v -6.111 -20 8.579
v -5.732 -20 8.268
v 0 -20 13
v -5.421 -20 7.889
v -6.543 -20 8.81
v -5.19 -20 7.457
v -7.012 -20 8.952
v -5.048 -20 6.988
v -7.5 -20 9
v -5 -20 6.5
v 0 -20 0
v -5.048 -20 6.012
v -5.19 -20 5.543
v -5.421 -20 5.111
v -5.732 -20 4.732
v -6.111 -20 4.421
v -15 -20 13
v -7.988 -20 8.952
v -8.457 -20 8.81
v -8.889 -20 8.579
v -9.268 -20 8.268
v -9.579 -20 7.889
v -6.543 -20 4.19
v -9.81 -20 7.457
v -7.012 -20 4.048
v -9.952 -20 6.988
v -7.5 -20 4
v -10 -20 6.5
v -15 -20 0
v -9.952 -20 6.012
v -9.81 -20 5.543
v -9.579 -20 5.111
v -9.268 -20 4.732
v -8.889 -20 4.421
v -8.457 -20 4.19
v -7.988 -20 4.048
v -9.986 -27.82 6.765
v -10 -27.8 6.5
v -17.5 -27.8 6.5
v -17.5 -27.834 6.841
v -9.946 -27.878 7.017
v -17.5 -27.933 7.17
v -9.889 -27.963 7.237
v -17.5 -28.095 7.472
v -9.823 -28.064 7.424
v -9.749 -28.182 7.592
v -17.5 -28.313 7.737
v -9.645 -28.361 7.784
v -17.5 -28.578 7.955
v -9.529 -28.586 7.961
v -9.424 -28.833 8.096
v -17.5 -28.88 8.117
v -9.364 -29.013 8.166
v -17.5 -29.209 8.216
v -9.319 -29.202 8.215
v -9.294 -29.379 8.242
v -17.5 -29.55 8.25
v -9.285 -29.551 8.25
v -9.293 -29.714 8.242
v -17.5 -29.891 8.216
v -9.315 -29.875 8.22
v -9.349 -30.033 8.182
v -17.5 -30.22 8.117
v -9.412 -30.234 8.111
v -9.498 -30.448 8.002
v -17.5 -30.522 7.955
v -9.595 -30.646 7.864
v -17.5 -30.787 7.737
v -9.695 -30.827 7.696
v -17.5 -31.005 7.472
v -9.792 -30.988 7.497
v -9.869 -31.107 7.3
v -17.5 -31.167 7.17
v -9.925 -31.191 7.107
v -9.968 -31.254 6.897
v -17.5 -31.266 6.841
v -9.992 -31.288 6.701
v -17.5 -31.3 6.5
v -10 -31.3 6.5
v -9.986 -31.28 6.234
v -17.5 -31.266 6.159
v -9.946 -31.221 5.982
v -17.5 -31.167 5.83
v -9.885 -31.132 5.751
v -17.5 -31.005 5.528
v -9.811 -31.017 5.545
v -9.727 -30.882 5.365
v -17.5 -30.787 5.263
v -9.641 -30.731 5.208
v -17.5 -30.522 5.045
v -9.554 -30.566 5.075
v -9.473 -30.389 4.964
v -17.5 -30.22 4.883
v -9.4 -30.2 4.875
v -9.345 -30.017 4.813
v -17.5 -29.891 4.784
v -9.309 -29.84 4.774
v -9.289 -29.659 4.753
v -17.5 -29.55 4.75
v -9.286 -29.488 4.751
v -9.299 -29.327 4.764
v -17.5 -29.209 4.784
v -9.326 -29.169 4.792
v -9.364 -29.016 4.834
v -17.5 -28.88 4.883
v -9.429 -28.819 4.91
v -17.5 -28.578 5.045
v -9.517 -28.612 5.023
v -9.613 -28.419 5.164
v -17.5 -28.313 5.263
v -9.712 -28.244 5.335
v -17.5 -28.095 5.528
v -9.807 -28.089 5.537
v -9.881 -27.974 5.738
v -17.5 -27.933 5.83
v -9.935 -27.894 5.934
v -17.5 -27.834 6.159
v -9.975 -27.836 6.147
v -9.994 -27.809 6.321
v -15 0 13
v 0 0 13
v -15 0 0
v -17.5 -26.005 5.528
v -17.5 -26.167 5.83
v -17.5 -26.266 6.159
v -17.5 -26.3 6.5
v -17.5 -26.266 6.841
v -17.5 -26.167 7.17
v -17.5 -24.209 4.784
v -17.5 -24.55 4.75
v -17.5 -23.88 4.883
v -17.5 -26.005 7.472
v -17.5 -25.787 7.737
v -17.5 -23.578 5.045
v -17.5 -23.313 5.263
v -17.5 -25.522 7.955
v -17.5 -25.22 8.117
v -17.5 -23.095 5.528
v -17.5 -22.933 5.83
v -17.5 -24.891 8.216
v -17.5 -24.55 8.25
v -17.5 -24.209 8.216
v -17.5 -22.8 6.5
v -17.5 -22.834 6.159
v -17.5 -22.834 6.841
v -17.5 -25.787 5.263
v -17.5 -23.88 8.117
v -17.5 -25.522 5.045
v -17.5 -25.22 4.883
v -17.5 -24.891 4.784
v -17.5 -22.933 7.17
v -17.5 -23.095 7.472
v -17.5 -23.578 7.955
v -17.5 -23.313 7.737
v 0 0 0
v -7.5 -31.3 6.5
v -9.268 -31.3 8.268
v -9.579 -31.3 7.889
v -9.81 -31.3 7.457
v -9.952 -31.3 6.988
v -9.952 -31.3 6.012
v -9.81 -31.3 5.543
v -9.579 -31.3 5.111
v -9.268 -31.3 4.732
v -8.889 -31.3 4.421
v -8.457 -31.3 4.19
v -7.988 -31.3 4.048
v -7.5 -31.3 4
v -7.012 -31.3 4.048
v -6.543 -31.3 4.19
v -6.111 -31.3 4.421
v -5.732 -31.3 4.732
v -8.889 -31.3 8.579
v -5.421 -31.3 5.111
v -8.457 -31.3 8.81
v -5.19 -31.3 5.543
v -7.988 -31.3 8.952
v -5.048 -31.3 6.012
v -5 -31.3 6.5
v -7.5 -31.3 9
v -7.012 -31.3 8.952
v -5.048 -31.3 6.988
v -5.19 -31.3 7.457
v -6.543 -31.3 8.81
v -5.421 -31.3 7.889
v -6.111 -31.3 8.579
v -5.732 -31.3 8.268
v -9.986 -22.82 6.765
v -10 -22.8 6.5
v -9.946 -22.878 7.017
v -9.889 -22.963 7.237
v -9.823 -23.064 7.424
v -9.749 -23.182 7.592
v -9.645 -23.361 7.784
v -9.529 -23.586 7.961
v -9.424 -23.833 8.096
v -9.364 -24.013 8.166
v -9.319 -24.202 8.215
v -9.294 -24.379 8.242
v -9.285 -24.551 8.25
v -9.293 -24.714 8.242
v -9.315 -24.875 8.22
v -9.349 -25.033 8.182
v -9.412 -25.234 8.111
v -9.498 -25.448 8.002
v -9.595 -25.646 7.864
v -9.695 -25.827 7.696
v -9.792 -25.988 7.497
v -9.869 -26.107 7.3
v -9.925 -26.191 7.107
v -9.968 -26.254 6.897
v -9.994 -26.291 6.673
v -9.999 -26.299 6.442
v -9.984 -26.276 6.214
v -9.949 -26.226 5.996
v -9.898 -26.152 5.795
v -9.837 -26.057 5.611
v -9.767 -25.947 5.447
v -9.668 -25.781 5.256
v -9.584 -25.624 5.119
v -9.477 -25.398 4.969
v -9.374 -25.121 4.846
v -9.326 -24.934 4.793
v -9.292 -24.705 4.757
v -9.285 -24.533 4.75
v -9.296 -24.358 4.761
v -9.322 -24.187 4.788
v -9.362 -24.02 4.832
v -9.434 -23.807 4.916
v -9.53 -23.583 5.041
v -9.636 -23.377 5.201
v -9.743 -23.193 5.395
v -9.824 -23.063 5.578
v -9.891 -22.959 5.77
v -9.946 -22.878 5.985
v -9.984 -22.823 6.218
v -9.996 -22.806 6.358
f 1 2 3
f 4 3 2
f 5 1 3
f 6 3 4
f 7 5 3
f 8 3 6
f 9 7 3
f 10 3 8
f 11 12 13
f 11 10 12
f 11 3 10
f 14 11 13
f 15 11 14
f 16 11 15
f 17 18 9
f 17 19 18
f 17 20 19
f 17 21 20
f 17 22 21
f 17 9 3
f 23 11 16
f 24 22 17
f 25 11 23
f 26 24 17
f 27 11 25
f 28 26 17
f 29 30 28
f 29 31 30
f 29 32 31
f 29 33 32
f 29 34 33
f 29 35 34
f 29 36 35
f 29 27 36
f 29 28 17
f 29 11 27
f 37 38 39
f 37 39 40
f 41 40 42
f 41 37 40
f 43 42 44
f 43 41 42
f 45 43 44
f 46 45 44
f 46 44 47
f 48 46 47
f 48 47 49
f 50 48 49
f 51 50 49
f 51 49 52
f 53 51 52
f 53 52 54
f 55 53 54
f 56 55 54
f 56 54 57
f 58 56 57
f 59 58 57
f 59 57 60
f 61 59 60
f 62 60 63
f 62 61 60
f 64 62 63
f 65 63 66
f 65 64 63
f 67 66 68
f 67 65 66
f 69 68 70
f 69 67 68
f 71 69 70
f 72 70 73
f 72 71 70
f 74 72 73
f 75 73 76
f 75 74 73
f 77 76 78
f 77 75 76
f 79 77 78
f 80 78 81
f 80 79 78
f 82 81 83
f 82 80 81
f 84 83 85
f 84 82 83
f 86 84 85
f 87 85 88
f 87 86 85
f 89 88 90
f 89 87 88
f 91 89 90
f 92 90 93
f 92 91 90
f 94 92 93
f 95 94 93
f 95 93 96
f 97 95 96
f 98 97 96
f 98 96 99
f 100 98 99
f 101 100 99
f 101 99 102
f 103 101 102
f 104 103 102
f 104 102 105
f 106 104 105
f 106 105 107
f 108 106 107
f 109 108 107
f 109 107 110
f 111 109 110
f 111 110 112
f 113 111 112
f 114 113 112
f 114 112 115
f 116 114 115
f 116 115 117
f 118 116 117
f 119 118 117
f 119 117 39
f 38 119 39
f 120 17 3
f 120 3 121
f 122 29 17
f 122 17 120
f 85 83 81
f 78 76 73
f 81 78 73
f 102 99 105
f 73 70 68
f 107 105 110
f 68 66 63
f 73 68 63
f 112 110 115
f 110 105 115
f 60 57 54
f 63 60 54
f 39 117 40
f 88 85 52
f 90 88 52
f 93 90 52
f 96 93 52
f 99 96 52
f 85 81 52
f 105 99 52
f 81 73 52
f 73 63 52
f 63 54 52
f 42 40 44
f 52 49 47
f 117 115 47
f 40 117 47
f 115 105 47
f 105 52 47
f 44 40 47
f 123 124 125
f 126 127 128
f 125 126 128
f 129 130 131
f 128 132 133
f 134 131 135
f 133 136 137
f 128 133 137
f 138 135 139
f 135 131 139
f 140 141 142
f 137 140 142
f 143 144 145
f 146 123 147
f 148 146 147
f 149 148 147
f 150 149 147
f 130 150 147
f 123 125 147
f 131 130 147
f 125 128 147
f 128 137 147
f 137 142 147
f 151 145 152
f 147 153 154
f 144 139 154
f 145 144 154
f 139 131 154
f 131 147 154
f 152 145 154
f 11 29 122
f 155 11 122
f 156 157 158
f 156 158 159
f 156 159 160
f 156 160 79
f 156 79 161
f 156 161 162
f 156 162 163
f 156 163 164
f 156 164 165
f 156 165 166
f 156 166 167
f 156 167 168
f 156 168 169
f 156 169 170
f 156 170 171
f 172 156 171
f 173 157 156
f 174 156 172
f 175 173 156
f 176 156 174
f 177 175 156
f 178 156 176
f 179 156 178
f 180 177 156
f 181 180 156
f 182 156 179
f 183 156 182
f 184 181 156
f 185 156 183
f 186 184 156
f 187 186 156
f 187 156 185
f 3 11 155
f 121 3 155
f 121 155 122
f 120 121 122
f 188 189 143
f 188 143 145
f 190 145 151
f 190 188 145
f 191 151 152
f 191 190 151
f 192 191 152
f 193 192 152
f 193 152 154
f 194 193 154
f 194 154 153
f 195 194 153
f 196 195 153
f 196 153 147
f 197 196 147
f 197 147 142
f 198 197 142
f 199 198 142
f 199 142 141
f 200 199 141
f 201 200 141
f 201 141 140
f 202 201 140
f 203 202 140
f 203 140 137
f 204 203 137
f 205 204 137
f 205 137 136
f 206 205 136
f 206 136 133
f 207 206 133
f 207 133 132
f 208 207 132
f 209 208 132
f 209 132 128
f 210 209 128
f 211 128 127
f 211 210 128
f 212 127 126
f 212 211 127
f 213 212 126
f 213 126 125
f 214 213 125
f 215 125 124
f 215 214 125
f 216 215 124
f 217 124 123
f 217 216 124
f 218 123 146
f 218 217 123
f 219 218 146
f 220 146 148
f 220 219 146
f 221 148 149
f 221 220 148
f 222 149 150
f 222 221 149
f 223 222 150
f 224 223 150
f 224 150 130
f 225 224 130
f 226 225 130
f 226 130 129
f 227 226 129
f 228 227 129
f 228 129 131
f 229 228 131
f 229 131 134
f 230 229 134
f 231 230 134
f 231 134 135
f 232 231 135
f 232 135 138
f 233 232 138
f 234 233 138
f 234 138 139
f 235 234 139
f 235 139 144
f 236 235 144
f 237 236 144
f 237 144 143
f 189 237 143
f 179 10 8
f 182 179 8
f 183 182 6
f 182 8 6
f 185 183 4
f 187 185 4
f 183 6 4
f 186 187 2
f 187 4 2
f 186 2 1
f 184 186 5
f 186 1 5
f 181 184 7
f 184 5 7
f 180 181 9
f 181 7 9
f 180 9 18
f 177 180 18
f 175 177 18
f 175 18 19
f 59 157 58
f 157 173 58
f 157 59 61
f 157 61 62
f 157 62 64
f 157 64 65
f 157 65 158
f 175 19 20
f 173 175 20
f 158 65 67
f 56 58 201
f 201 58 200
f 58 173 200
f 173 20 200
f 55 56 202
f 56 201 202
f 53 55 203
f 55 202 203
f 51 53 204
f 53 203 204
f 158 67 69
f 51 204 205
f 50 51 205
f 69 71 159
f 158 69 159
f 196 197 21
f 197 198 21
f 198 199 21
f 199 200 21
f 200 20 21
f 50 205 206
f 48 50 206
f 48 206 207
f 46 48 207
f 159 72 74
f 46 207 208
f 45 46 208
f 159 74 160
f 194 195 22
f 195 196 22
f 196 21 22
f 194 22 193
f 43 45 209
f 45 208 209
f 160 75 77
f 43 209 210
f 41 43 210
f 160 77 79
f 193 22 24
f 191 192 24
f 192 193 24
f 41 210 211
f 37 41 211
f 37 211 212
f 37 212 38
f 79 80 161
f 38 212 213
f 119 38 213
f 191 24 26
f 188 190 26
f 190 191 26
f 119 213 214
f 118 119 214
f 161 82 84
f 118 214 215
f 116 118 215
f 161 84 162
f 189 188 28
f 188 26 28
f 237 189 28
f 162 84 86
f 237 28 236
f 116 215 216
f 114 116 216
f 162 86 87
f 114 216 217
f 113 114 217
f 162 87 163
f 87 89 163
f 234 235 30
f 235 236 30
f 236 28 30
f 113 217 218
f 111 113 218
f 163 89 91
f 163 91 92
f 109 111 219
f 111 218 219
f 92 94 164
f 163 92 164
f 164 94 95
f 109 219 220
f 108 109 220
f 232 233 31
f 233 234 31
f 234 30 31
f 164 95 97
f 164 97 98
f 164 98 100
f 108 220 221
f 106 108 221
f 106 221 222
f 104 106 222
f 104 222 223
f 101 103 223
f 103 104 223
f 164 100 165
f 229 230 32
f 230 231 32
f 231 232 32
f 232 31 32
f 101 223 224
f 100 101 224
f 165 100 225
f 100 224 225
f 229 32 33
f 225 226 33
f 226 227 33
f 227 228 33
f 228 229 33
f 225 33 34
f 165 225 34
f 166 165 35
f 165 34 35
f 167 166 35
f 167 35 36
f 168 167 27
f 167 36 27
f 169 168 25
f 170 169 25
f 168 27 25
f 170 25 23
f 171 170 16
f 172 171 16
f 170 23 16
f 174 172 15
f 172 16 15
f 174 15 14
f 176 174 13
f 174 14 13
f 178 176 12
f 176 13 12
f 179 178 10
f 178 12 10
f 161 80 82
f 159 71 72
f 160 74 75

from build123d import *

# Parameters (mm, degrees)
SKETCH1_W           = 20
SKETCH1_H           = 15
BOSS_EXTRUDE1_DEPTH = 13
SKETCH2_R           = 2.5
BOSS_EXTRUDE2_DEPTH = 11.3
BOSS_EXTRUDE3_START = -7.5
SKETCH3_R           = 1.75
BOSS_EXTRUDE3_DEPTH = 10


with BuildPart() as part:
    # Sketch1 → Boss-Extrude1 (new body)
    with BuildSketch(Plane(origin=(0, 0, 0), x_dir=(0, 1, 0), z_dir=(0, 0, 1))):
        with Locations((-10, 7.5)):
            Rectangle(SKETCH1_W, SKETCH1_H)
    extrude(amount=BOSS_EXTRUDE1_DEPTH)

    # Sketch2 → Boss-Extrude2 (add)
    with BuildSketch(Plane.XZ.offset(20)):
        with Locations((-7.5, 6.5)):
            Circle(SKETCH2_R)
    extrude(amount=BOSS_EXTRUDE2_DEPTH)

    # Sketch3 → Boss-Extrude3 (add)
    with BuildSketch(Plane.YZ.offset(BOSS_EXTRUDE3_START)):
        with Locations((-29.55, 6.5)):
            Circle(SKETCH3_R)
        with Locations((-24.55, 6.5)):
            Circle(SKETCH3_R)
    extrude(amount=-BOSS_EXTRUDE3_DEPTH)


solid = part.part
